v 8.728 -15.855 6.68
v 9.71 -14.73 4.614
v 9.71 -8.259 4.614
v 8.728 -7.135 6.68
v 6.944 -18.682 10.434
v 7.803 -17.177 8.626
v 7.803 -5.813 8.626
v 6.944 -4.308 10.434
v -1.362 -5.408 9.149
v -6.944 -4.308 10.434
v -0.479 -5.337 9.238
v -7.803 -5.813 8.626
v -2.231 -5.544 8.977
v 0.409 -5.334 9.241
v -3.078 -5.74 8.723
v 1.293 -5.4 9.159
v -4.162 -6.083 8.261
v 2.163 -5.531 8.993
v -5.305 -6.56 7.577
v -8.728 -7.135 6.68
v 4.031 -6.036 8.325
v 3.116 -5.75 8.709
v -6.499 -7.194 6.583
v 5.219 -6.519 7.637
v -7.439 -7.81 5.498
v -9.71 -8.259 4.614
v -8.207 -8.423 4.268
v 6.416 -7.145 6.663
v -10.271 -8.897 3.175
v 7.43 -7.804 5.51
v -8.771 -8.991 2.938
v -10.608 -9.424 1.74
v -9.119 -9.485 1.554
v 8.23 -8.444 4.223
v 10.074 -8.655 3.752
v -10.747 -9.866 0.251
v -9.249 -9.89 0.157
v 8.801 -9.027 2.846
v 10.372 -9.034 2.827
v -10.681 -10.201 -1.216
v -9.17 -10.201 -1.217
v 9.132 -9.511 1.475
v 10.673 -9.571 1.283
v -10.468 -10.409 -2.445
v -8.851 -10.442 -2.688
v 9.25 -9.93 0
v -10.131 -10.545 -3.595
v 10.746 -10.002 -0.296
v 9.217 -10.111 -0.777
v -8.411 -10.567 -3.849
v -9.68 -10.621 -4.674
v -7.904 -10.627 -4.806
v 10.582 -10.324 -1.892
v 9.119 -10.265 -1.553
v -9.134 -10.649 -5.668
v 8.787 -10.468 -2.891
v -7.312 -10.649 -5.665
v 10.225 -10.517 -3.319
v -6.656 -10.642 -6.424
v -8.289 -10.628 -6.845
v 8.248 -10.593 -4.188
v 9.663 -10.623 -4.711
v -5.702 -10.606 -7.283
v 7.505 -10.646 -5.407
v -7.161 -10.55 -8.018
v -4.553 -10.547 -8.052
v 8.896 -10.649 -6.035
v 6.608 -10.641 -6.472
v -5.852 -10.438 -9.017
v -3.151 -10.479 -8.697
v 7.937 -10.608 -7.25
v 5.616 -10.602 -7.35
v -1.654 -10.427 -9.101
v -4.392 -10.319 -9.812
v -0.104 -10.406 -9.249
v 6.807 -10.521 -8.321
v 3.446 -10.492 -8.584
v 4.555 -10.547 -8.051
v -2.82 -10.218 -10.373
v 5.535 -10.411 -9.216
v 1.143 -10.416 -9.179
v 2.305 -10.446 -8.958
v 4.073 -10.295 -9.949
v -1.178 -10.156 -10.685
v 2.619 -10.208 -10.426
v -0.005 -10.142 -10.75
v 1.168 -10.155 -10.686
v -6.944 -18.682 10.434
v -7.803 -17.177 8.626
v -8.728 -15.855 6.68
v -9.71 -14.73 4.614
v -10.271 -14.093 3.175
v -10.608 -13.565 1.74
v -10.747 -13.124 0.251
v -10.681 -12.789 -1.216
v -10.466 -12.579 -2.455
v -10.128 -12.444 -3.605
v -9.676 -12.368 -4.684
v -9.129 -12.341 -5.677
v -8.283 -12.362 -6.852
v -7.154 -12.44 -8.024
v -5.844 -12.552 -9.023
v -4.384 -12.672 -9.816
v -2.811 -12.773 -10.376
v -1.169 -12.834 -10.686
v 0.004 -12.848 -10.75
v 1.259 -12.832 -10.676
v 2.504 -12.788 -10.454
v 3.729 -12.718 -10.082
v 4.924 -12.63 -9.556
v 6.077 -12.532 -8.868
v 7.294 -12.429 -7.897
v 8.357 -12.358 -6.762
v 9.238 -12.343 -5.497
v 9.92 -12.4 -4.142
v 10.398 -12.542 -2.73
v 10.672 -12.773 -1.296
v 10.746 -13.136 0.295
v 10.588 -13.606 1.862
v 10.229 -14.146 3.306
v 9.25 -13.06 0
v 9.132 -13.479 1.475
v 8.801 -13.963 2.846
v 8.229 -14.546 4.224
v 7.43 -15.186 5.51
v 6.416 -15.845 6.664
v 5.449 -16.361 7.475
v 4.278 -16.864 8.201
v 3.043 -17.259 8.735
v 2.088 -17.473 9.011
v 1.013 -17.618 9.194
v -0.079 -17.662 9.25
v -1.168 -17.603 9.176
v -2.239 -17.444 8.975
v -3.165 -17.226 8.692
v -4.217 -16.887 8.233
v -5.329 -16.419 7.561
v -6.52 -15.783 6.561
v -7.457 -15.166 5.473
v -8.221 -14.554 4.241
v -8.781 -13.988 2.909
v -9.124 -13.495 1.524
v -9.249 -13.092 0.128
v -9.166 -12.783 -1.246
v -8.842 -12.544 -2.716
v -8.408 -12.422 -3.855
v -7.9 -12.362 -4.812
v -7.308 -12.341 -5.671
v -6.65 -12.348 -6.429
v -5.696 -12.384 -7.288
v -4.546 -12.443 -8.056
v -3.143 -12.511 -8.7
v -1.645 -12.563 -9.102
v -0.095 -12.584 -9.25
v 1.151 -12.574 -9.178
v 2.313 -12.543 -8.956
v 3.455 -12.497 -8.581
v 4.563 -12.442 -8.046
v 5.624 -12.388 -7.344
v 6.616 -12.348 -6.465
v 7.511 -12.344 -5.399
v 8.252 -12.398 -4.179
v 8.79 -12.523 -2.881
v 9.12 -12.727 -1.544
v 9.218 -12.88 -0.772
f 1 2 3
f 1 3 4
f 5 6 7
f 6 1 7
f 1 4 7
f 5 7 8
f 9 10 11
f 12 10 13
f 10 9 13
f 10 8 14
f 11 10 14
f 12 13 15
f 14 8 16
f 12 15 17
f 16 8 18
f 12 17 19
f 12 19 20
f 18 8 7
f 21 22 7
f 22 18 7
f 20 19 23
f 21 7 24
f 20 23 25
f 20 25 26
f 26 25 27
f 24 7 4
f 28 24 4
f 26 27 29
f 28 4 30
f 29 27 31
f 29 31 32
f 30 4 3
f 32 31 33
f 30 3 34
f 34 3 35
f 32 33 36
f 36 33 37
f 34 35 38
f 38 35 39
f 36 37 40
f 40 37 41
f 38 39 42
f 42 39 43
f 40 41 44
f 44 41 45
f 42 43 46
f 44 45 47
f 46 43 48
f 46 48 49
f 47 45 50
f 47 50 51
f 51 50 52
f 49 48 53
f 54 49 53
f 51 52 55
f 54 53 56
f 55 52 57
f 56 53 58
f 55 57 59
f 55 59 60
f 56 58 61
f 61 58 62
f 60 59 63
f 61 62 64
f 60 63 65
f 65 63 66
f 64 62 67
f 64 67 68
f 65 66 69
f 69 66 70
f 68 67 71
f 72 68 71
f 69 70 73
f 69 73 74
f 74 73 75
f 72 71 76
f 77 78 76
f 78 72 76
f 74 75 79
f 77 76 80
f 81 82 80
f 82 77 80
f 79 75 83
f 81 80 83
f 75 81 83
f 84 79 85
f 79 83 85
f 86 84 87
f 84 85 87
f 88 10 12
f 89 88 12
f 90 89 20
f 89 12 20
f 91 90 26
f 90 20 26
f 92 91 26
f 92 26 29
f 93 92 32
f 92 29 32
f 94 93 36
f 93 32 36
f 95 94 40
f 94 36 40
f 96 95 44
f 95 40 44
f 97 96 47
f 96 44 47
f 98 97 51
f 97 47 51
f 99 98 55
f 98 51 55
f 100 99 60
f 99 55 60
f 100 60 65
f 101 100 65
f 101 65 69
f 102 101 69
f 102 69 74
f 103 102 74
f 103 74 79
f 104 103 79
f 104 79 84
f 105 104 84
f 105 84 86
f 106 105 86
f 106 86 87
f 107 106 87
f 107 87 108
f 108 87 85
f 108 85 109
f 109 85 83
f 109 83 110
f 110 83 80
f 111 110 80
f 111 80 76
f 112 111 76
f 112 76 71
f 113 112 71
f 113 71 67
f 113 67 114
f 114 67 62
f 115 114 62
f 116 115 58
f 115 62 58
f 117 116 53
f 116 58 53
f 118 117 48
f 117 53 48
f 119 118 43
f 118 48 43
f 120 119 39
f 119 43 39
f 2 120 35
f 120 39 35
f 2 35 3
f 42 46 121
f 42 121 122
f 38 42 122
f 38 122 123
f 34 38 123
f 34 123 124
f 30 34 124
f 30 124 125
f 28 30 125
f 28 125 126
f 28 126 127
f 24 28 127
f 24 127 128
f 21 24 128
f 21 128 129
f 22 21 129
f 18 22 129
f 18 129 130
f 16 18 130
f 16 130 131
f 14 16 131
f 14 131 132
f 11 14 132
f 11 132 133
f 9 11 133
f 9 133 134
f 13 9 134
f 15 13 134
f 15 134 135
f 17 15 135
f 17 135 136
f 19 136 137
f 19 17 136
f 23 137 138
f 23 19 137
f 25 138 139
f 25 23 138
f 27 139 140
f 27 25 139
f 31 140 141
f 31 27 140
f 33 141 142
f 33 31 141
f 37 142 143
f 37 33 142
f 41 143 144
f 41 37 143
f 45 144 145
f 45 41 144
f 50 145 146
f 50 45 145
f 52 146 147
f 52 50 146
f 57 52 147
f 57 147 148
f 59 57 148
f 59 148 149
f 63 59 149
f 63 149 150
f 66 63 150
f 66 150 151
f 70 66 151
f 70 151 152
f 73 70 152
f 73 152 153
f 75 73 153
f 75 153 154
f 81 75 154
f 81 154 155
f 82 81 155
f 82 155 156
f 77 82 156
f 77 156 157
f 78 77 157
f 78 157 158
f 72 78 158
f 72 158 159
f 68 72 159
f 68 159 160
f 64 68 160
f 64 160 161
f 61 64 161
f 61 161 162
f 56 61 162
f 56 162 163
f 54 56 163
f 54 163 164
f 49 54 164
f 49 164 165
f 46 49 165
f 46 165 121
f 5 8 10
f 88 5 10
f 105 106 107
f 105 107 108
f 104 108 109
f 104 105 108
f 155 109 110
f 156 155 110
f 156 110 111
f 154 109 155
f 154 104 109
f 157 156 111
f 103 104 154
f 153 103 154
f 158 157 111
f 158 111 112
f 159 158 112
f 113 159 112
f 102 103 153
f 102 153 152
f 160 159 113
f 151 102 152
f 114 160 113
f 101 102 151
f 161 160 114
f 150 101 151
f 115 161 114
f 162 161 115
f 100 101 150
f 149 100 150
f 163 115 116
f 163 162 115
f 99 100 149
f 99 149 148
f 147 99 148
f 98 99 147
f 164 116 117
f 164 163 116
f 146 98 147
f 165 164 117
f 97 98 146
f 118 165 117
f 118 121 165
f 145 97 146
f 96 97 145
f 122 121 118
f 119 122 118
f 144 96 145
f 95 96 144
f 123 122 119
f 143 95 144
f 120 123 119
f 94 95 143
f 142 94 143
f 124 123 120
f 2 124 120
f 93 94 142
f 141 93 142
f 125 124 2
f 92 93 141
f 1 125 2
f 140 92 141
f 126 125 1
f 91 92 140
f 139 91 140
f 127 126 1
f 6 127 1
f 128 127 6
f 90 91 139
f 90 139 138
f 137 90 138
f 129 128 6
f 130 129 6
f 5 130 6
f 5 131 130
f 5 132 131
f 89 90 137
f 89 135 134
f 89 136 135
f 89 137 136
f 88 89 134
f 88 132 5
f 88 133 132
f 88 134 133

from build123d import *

# Parameters (mm, degrees)
F0_R     = 9.25
F1_DEPTH = 25.4
F3_DEPTH = 12.7


with BuildPart() as f1:
    # F0 (on Front) → F1 (new body)
    with BuildSketch(Plane.XZ):
        with BuildLine():
            Line((-6.943914, 10.433888), (-9.709526, 4.61385))
            ThreePointArc((-9.709526, 4.61385), (0, -10.75), (9.709526, 4.61385))
            Line((9.709526, 4.61385), (6.943914, 10.433888))
            Line((6.943914, 10.433888), (2.587756, 10.433888))
            Line((2.587756, 10.433888), (-2.587756, 10.433888))
            Line((-2.587756, 10.433888), (-6.943914, 10.433888))
        make_face()
        Circle(F0_R, mode=Mode.SUBTRACT)
    extrude(amount=F1_DEPTH)

    # F2 (on Right) → F3 (cut, symmetric)
    with BuildSketch(Plane.YZ):
        with BuildLine():
            ThreePointArc((-12.888511, -10.942341), (-13.328314, 0.984679), (-19.44893, 11.230912))
            Line((-19.44893, 11.230912), (-29.896255, 11.230912))
            Line((-29.896255, 11.230912), (-28.956093, -13.811551))
            Line((-28.956093, -13.811551), (-12.888511, -10.942341))
        make_face()
        with BuildLine():
            Line((6.906466, 11.230912), (-3.540859, 11.230912))
            ThreePointArc((-3.540859, 11.230912), (-9.661475, 0.984679), (-10.101278, -10.942341))
            Line((-10.101278, -10.942341), (5.966304, -13.811551))
            Line((5.966304, -13.811551), (6.906466, 11.230912))
        make_face()
    extrude(amount=F3_DEPTH, both=True, mode=Mode.SUBTRACT)


solid = f1.part
